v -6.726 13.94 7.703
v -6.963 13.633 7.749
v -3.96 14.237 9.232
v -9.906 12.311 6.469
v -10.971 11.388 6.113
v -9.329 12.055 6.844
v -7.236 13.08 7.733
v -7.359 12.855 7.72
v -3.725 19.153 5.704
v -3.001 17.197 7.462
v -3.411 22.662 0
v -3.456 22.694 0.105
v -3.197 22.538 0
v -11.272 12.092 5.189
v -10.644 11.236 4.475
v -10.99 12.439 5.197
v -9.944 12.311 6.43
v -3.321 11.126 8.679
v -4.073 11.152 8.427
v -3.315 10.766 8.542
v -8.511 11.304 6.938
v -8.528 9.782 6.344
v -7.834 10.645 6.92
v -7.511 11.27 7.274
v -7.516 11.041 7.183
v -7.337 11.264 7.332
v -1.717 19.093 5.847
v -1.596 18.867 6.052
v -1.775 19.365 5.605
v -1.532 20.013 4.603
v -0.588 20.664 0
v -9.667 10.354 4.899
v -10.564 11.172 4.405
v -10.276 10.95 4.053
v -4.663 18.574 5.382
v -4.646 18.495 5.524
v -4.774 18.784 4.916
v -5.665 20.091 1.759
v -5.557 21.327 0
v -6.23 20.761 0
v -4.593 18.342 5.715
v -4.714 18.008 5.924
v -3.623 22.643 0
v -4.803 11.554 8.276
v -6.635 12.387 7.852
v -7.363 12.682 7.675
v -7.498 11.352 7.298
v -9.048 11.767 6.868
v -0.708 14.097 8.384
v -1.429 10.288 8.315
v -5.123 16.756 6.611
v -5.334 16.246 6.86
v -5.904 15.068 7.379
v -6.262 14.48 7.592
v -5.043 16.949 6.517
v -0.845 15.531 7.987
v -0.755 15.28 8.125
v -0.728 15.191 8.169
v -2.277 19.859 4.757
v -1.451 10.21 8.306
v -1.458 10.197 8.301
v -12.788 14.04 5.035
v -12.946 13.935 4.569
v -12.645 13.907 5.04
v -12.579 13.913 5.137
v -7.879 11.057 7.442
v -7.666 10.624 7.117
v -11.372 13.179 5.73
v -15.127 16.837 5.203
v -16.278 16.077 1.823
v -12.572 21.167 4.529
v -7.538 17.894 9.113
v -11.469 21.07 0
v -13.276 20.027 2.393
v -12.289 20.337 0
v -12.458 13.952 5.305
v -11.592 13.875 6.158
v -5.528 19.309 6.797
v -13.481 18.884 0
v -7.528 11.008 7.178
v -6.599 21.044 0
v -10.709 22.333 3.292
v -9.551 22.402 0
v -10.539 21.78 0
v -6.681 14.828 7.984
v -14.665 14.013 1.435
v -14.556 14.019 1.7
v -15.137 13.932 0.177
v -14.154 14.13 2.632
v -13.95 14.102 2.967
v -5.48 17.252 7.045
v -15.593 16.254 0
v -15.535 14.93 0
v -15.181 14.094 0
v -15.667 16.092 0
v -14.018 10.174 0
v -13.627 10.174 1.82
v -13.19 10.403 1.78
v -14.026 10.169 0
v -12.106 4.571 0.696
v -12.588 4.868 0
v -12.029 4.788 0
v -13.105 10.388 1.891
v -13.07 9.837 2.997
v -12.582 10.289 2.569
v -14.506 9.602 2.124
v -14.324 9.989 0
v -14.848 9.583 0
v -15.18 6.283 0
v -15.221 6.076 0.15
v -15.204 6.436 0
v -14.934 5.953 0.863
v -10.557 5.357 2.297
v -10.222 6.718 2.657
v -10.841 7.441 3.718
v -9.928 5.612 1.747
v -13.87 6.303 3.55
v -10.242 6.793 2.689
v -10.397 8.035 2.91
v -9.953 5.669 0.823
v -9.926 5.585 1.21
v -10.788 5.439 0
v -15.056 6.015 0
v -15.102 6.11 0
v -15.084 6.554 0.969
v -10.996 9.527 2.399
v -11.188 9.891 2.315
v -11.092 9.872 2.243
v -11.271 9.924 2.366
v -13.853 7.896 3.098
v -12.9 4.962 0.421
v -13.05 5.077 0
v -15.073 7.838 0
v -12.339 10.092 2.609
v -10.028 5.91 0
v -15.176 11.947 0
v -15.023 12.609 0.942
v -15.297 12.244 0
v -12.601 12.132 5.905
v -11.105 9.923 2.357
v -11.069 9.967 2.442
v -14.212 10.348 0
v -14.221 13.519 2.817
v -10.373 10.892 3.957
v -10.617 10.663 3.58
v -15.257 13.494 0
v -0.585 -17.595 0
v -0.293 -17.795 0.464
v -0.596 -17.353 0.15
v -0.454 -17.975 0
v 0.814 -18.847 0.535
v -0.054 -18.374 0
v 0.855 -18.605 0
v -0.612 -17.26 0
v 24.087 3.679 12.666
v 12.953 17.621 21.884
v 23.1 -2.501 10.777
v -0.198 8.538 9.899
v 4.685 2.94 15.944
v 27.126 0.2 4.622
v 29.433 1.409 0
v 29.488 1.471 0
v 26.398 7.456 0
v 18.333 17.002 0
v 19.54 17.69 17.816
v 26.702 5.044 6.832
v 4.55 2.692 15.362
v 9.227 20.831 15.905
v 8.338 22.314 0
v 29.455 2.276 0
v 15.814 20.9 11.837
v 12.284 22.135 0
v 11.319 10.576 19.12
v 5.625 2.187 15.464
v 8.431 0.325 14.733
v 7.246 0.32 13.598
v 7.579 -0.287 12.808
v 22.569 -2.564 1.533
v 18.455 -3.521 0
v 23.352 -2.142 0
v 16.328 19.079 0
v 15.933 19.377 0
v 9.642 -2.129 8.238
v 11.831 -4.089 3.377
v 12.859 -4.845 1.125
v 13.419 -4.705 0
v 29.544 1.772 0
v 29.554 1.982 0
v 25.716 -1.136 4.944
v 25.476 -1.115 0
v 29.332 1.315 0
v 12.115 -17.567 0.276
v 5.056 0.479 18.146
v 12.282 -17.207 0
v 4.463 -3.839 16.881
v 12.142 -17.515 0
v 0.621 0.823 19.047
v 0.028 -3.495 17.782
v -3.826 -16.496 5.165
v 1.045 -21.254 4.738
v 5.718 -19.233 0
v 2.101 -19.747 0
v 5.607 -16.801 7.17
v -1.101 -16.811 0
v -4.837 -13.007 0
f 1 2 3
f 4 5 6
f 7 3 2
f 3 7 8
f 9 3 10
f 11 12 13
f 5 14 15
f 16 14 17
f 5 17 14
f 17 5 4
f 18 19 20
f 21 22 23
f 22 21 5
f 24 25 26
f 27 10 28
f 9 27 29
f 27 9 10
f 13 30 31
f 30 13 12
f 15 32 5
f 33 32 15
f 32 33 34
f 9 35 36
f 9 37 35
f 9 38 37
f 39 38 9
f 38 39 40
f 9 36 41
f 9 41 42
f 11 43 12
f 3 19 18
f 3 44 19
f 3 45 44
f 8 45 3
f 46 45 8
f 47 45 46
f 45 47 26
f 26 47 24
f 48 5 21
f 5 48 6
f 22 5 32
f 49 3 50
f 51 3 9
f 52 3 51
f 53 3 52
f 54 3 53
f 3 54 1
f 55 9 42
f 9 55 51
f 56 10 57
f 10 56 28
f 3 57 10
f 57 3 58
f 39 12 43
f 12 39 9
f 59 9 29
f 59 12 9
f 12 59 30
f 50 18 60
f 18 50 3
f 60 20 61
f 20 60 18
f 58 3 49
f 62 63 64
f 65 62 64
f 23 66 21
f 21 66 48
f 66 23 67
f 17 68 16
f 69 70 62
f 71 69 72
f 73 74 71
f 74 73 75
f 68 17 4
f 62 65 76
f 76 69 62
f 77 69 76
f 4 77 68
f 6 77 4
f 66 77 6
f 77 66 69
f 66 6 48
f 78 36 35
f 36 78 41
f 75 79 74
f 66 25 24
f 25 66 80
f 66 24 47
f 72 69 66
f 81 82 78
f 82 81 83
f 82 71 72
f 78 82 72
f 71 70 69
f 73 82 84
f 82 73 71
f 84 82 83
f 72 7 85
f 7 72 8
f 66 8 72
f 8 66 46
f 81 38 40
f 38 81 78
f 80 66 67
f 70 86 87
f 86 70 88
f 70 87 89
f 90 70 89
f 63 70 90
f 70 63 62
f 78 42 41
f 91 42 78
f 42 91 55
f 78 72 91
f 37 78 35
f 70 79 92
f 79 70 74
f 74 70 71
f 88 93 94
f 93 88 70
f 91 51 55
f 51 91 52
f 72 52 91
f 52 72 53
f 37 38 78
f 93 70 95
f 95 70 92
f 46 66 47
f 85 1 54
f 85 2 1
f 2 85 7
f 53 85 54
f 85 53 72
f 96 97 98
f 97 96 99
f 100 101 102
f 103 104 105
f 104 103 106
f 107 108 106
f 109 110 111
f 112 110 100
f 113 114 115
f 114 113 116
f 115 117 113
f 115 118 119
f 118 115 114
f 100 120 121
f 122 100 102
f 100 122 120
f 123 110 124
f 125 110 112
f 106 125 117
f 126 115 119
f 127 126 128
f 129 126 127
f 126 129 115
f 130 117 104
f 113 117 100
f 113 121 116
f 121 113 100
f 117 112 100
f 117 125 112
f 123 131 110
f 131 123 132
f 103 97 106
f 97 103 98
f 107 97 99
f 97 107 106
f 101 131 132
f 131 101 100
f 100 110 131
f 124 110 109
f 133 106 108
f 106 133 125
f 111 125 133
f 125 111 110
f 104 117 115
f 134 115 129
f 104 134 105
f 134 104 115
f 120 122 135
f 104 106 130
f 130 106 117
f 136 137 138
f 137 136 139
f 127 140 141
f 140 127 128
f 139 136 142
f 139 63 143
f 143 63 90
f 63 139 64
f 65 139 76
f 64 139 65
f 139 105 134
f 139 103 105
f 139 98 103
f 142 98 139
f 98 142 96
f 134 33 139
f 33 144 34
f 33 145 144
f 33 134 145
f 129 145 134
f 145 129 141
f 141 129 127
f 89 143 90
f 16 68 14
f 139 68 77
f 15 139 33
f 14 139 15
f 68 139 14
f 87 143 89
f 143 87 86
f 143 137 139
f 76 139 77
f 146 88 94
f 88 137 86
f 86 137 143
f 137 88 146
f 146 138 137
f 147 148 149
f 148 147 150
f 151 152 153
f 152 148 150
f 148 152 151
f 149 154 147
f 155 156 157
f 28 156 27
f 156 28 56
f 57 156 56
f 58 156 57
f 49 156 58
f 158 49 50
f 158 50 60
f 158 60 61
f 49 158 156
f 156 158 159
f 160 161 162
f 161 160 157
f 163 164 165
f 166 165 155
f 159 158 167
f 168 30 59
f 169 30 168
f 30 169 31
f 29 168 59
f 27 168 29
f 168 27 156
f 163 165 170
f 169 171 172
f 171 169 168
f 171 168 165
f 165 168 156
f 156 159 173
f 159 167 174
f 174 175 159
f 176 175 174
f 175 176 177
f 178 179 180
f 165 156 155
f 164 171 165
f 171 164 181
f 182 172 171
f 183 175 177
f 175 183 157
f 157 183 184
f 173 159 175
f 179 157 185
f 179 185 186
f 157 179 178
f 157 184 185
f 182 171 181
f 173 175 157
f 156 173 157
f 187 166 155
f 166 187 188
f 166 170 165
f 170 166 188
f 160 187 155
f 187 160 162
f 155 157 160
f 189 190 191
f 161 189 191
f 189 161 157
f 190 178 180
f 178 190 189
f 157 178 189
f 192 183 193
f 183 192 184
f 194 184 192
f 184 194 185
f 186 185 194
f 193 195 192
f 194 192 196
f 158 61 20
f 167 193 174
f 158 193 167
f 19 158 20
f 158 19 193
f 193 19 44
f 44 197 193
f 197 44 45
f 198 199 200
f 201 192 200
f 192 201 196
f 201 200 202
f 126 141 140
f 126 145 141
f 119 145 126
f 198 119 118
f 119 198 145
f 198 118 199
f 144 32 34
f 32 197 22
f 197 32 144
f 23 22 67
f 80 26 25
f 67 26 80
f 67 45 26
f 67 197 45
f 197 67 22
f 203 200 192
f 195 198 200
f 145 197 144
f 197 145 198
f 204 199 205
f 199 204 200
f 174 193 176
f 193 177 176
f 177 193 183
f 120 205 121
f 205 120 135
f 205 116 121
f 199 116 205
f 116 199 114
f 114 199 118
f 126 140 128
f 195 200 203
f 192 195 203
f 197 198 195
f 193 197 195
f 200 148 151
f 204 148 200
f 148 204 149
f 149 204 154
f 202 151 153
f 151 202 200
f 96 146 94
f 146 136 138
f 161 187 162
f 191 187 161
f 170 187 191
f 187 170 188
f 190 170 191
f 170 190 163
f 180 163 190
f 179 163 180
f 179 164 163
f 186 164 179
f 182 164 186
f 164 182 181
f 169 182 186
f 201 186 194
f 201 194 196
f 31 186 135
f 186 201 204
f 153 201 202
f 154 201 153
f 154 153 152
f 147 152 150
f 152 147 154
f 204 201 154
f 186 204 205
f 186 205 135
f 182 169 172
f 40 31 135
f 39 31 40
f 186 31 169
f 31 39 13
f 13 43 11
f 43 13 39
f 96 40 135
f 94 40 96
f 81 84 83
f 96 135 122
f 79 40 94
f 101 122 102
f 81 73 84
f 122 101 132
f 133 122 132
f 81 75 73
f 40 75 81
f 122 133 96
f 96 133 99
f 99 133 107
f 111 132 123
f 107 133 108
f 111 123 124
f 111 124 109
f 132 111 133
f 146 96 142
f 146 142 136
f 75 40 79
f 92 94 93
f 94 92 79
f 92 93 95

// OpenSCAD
/*
    Rock Formations Generator
    
    Fernando Jerez 2017
    License: CC-NC

*/

// This is only to force Customizer create many files. Changes doesn´t matter. Just click CREATE THING
part = "one"; // [one:Formation #1, two:Formation #2, three:Formation #3, four:Formation #4,five:Formation #5]

// : More corners --> More 'spheric' central stone
number_of_corners = 7; // [5:30]

// : Deforms central stone in vert  ical
stone_scale = [1,1,1]; // [0.2:0.1:3]

// Number of medium size stones
medium_stones = 2; // [5:30]

// Number of small stones
small_stones = 6; // [5:30]

/* [Hidden] */
radius = 20;
corner_size = 8;

// Example
intersection(){
    union(){
    
        // big central stone
        scale(stone_scale)
        
        translate([radius*.6,radius*.6,0])
        randomRock(radius,corner_size,number_of_corners);

        scale(stone_scale)
        
        randomRock(radius,corner_size,number_of_corners);

        // medium size stones
        if(medium_stones>0){
            for(i=[1:medium_stones]){
                // random position in 'circle'
                z = rands(0,360,1)[0];
                rotate([0,0,z])
                
                // translate radius
                translate([rands(radius*0.6,radius*0.9,1)[0],0,0])
        scale(stone_scale)
                randomRock(rands(radius*0.3,radius*0.5,1)[0],corner_size*0.5,15);
            }
        }
        
        // small stones
        if(small_stones>0){
            for(i=[0:small_stones]){
                // random position in 'circle'
                z = rands(0,360,1)[0];
                rotate([0,0,z])
                
                // translate radius
                translate([rands(radius*0.7,radius*1.15,1)[0],0,0])
        scale(stone_scale)
                randomRock(rands(radius*0.1,radius*0.3,1)[0],corner_size*0.5,10);
            }
        }

    }
    // cut half of figure
    translate([-50,-50,0]) cube(100);
}


 

// Module randomRock : draws a random rock
module randomRock(radius,corner_size,number_of_corners){
    // Draw rock
    hull(){
        // Make a hull..
        for(i=[0:number_of_corners]){
            // random position in 'sphere'
            y = rands(0,360,1)[0];
            z = rands(0,360,1)[0];
            cubesize=rands(corner_size*0.5,corner_size,1)[0];
            rotate([0,y,z])
            
            // translate radius (minus half of corner size)
            translate([radius-corner_size*0.5,0,0])
            
            // draw cube as corner
            rotate([rands(0,360,1)[0],rands(0,360,1)[0],rands(0,360,1)[0]]) // random rotation
            cube([cubesize,cubesize,cubesize],center = true);
                
        }
    }

    // Done!
}
